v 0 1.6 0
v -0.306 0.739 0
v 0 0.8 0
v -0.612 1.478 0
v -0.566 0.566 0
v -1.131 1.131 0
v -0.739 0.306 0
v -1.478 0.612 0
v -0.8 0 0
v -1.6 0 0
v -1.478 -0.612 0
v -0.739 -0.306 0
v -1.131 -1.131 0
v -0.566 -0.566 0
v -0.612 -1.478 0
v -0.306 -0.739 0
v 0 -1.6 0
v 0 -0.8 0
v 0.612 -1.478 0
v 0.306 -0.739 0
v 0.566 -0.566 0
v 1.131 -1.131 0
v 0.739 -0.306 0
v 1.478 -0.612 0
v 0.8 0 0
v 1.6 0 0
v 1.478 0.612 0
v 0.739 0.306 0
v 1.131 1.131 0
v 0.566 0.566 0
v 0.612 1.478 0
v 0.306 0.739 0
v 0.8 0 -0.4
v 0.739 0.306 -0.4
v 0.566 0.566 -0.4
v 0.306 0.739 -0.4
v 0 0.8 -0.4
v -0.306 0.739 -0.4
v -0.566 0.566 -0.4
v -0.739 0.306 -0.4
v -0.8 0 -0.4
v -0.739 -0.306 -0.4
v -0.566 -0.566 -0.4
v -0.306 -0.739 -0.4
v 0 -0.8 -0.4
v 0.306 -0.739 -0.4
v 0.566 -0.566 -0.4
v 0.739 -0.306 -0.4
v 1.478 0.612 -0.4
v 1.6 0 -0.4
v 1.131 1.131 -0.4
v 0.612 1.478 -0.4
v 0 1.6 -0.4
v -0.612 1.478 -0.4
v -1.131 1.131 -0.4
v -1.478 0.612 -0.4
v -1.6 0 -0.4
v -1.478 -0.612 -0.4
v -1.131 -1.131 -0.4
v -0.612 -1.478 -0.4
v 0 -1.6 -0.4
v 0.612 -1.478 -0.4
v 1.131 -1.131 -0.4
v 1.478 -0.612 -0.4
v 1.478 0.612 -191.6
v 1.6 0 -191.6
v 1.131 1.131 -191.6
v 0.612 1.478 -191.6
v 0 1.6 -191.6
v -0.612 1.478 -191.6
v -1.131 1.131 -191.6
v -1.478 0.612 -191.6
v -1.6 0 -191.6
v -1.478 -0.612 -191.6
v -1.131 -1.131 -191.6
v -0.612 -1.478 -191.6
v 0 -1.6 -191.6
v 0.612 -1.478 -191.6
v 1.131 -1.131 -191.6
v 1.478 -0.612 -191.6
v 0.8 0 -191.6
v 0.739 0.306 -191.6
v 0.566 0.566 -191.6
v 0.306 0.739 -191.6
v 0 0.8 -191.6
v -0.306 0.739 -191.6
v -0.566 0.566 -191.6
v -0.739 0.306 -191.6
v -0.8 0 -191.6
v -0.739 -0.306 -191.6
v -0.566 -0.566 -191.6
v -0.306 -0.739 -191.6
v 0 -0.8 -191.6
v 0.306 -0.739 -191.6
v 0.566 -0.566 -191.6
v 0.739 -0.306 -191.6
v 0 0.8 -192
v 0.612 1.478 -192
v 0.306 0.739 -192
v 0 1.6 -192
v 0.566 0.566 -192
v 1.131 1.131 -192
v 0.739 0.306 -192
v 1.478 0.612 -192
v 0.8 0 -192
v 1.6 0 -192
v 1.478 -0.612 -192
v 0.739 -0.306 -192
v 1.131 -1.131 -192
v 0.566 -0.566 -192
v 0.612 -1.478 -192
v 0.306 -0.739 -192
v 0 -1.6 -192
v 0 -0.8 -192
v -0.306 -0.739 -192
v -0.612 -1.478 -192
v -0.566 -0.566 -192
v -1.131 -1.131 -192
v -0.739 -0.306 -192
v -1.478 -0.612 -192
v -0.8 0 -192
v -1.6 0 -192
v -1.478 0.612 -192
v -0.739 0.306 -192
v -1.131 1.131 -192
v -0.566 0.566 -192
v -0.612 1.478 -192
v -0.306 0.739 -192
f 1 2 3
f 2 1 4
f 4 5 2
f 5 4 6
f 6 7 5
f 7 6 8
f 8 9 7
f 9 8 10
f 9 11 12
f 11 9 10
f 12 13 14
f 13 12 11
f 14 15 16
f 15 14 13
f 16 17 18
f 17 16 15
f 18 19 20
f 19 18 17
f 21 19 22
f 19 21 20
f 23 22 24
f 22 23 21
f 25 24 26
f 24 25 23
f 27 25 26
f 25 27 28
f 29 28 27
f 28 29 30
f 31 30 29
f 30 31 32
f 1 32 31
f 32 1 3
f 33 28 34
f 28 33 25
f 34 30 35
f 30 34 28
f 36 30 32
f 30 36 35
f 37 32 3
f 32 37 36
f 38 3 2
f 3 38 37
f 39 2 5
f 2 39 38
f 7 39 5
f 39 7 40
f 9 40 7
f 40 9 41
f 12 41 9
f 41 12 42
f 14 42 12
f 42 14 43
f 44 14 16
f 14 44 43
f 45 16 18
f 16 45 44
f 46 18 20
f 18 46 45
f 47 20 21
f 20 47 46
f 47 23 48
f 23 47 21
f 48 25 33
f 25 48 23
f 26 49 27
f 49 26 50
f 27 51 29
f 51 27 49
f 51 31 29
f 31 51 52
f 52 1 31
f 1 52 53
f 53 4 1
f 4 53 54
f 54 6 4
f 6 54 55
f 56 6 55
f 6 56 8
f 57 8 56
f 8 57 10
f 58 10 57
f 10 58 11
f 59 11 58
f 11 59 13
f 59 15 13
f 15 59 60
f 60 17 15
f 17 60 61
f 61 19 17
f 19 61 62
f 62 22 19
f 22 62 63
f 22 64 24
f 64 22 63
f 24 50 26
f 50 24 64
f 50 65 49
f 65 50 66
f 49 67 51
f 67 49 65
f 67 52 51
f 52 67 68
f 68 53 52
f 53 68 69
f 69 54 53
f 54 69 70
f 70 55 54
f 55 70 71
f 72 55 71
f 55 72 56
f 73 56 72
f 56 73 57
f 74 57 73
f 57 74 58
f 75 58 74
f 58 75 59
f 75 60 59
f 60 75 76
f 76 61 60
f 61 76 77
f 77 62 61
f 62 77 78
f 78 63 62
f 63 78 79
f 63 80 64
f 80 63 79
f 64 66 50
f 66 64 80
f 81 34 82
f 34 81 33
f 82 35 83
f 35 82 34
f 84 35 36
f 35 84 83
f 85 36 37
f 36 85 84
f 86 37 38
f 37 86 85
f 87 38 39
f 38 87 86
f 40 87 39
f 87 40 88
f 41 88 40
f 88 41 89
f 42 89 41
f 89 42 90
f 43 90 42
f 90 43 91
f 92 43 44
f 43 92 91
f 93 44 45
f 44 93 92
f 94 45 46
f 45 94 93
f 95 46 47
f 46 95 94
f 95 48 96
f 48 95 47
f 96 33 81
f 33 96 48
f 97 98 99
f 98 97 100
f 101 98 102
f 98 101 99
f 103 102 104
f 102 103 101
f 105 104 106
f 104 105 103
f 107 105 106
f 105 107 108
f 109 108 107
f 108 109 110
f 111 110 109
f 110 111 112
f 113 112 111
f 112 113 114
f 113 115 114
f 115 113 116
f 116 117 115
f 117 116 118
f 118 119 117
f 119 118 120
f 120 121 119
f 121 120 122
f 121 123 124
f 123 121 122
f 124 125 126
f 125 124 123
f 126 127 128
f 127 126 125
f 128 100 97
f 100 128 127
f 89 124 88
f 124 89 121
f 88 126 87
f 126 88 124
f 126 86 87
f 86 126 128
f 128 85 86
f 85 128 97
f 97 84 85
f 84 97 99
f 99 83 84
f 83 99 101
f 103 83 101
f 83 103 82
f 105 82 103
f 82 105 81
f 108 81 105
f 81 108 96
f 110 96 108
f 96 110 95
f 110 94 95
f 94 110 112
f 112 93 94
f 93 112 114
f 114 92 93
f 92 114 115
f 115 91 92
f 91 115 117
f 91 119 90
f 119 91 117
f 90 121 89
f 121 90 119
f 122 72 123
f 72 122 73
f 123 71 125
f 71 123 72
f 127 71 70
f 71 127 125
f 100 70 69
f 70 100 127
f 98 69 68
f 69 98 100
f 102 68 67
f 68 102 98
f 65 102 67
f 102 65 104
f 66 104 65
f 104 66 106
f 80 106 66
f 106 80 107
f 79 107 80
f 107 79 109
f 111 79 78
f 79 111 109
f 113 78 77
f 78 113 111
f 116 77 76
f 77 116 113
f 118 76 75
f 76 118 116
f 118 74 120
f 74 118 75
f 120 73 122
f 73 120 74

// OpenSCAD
// file: ../p/4-4ring1.scad
use <../lib.scad>
function ldraw_lib__4_4ring1() = [
// 0 Ring  1 x 1.0
// 0 Name: 4-4ring1.dat
// 0 Author: James Jessiman
// 0 !LDRAW_ORG Primitive UPDATE 2009-01
// 0 !LICENSE Licensed under CC BY 2.0 and CC BY 4.0 : see CAreadme.txt
// 
// 0 BFC CERTIFY CCW
  [0,"BFC","CERTIFY"],
  [0,"BFC","CCW"],
// 
// 0 !HISTORY 1998-12-15 [PTadmin] Official Update 1998-10
// 0 !HISTORY 2002-04-08 [BrickCaster] Modified for BFC compliance
// 0 !HISTORY 2002-04-25 [PTadmin] Official Update 2002-02
// 0 !HISTORY 2007-06-24 [PTadmin] Header formatted for Contributor Agreement
// 0 !HISTORY 2008-07-01 [PTadmin] Official Update 2008-01
// 0 !HISTORY 2008-08-26 [cwdee] Switch polygon winding and rename
// 0 !HISTORY 2009-05-02 [PTadmin] Official Update 2009-01
// 
// 
// 4 16 -0.7654 0 1.8478 -0.3827 0 0.9239 0 0 1 0 0 2
  [4,16,-0.7654,0,1.8478,-0.3827,0,0.9239,0,0,1,0,0,2],
// 4 16 -1.4142 0 1.4142 -0.7071 0 0.7071 -0.3827 0 0.9239 -0.7654 0 1.8478
  [4,16,-1.4142,0,1.4142,-0.7071,0,0.7071,-0.3827,0,0.9239,-0.7654,0,1.8478],
// 4 16 -1.8478 0 0.7654 -0.9239 0 0.3827 -0.7071 0 0.7071 -1.4142 0 1.41420
  [4,16,-1.8478,0,0.7654,-0.9239,0,0.3827,-0.7071,0,0.7071,-1.4142,0,1.41420],
// 4 16 -2 0 0 -1 0 0 -0.9239 0 0.3827 -1.8478 0 0.7654
  [4,16,-2,0,0,-1,0,0,-0.9239,0,0.3827,-1.8478,0,0.7654],
// 4 16 -1.8478 0 -0.7654 -0.9239 0 -0.3827 -1 0 0 -2 0 0
  [4,16,-1.8478,0,-0.7654,-0.9239,0,-0.3827,-1,0,0,-2,0,0],
// 4 16 -1.4142 0 -1.4142 -0.7071 0 -0.7071 -0.9239 0 -0.3827 -1.8478 0 -0.7654
  [4,16,-1.4142,0,-1.4142,-0.7071,0,-0.7071,-0.9239,0,-0.3827,-1.8478,0,-0.7654],
// 4 16 -0.7654 0 -1.8478 -0.3827 0 -0.9239 -0.7071 0 -0.7071 -1.4142 0 -1.4142
  [4,16,-0.7654,0,-1.8478,-0.3827,0,-0.9239,-0.7071,0,-0.7071,-1.4142,0,-1.4142],
// 4 16 0 0 -2 0 0 -1 -0.3827 0 -0.9239 -0.7654 0 -1.8478
  [4,16,0,0,-2,0,0,-1,-0.3827,0,-0.9239,-0.7654,0,-1.8478],
// 4 16 0.7654 0 -1.8478 0.3827 0 -0.9239 0 0 -1 0 0 -2
  [4,16,0.7654,0,-1.8478,0.3827,0,-0.9239,0,0,-1,0,0,-2],
// 4 16 1.4142 0 -1.4142 0.7071 0 -0.7071 0.3827 0 -0.9239 0.7654 0 -1.8478
  [4,16,1.4142,0,-1.4142,0.7071,0,-0.7071,0.3827,0,-0.9239,0.7654,0,-1.8478],
// 4 16 1.8478 0 -0.7654 0.9239 0 -0.3827 0.7071 0 -0.7071 1.4142 0 -1.4142
  [4,16,1.8478,0,-0.7654,0.9239,0,-0.3827,0.7071,0,-0.7071,1.4142,0,-1.4142],
// 4 16 2 0 0 1 0 0 0.9239 0 -0.3827 1.8478 0 -0.7654
  [4,16,2,0,0,1,0,0,0.9239,0,-0.3827,1.8478,0,-0.7654],
// 4 16 1.8478 0 0.7654 0.9239 0 0.3827 1 0 0 2 0 0
  [4,16,1.8478,0,0.7654,0.9239,0,0.3827,1,0,0,2,0,0],
// 4 16 1.4142 0 1.4142 0.7071 0 0.7071 0.9239 0 0.3827 1.8478 0 0.7654
  [4,16,1.4142,0,1.4142,0.7071,0,0.7071,0.9239,0,0.3827,1.8478,0,0.7654],
// 4 16 0.7654 0 1.8478 0.3827 0 0.9239 0.7071 0 0.7071 1.4142 0 1.4142
  [4,16,0.7654,0,1.8478,0.3827,0,0.9239,0.7071,0,0.7071,1.4142,0,1.4142],
// 4 16 0 0 2 0 0 1 0.3827 0 0.9239 0.7654 0 1.8478
  [4,16,0,0,2,0,0,1,0.3827,0,0.9239,0.7654,0,1.8478],
// 0
];
makepoly(ldraw_lib__4_4ring1(), line=0.2);
// file: ../p/4-4edge.scad
use <../lib.scad>
function ldraw_lib__4_4edge() = [
// 0 Circle 1.0
// 0 Name: 4-4edge.dat
// 0 Author: James Jessiman
// 0 !LDRAW_ORG Primitive UPDATE 2017-01
// 0 !LICENSE Licensed under CC BY 2.0 and CC BY 4.0 : see CAreadme.txt
// 
// 0 BFC CERTIFY CCW
  [0,"BFC","CERTIFY"],
  [0,"BFC","CCW"],
// 
// 0 !HISTORY 1998-12-15 [PTadmin] Official Update 1998-10
// 0 !HISTORY 2005-12-28 [PTadmin] Official Update 2005-01
// 0 !HISTORY 2007-06-24 [PTadmin] Header formatted for Contributor Agreement
// 0 !HISTORY 2008-07-01 [PTadmin] Official Update 2008-01
// 0 !HISTORY 2017-01-15 [Steffen] BFCed
// 0 !HISTORY 2017-12-30 [PTadmin] Official Update 2017-01
// 
// 
// 2 24 1 0 0 0.9239 0 0.3827
  [2,24,1,0,0,0.9239,0,0.3827],
// 2 24 0.9239 0 0.3827 0.7071 0 0.7071
  [2,24,0.9239,0,0.3827,0.7071,0,0.7071],
// 2 24 0.7071 0 0.7071 0.3827 0 0.9239
  [2,24,0.7071,0,0.7071,0.3827,0,0.9239],
// 2 24 0.3827 0 0.9239 0 0 1
  [2,24,0.3827,0,0.9239,0,0,1],
// 2 24 0 0 1 -0.3827 0 0.9239
  [2,24,0,0,1,-0.3827,0,0.9239],
// 2 24 -0.3827 0 0.9239 -0.7071 0 0.7071
  [2,24,-0.3827,0,0.9239,-0.7071,0,0.7071],
// 2 24 -0.7071 0 0.7071 -0.9239 0 0.3827
  [2,24,-0.7071,0,0.7071,-0.9239,0,0.3827],
// 2 24 -0.9239 0 0.3827 -1 0 -0
  [2,24,-0.9239,0,0.3827,-1,0,-0],
// 2 24 -1 0 -0 -0.9239 0 -0.3827
  [2,24,-1,0,-0,-0.9239,0,-0.3827],
// 2 24 -0.9239 0 -0.3827 -0.7071 0 -0.7071
  [2,24,-0.9239,0,-0.3827,-0.7071,0,-0.7071],
// 2 24 -0.7071 0 -0.7071 -0.3827 0 -0.9239
  [2,24,-0.7071,0,-0.7071,-0.3827,0,-0.9239],
// 2 24 -0.3827 0 -0.9239 0 0 -1
  [2,24,-0.3827,0,-0.9239,0,0,-1],
// 2 24 0 0 -1 0.3827 0 -0.9239
  [2,24,0,0,-1,0.3827,0,-0.9239],
// 2 24 0.3827 0 -0.9239 0.7071 0 -0.7071
  [2,24,0.3827,0,-0.9239,0.7071,0,-0.7071],
// 2 24 0.7071 0 -0.7071 0.9239 0 -0.3827
  [2,24,0.7071,0,-0.7071,0.9239,0,-0.3827],
// 2 24 0.9239 0 -0.3827 1 0 0
  [2,24,0.9239,0,-0.3827,1,0,0],
];
makepoly(ldraw_lib__4_4edge(), line=0.2);
// file: ../p/4-4cyli.scad
use <../lib.scad>
function ldraw_lib__4_4cyli() = [
// 0 Cylinder 1.0
// 0 Name: 4-4cyli.dat
// 0 Author: James Jessiman
// 0 !LDRAW_ORG Primitive UPDATE 2005-01
// 0 !LICENSE Licensed under CC BY 2.0 and CC BY 4.0 : see CAreadme.txt
// 
// 0 BFC CERTIFY CCW
  [0,"BFC","CERTIFY"],
  [0,"BFC","CCW"],
// 
// 0 !HISTORY 1998-12-15 [PTadmin] Official Update 1998-10
// 0 !HISTORY 2002-03-23 [sbliss] Added BFC statement; merged headers from files in distributions LDraw 0.27 and Complete.
// 0 !HISTORY 2002-04-25 [PTadmin] Official Update 2002-02
// 0 !HISTORY 2004-12-14 [guyvivan] BFC CCW
// 0 !HISTORY 2005-12-28 [PTadmin] Official Update 2005-01
// 0 !HISTORY 2007-06-24 [PTadmin] Header formatted for Contributor Agreement
// 0 !HISTORY 2008-07-01 [PTadmin] Official Update 2008-01
// 
// 
// 4 16 1 1 0 0.9239 1 0.3827 0.9239 0 0.3827 1 0 0
  [4,16,1,1,0,0.9239,1,0.3827,0.9239,0,0.3827,1,0,0],
// 5 24 1 0 0 1 1 0 0.9239 0 0.3827 0.9239 0 -0.3827
  [5,24,1,0,0,1,1,0,0.9239,0,0.3827,0.9239,0,-0.3827],
// 4 16 0.9239 1 0.3827 0.7071 1 0.7071 0.7071 0 0.7071 0.9239 0 0.3827
  [4,16,0.9239,1,0.3827,0.7071,1,0.7071,0.7071,0,0.7071,0.9239,0,0.3827],
// 5 24 0.9239 0 0.3827 0.9239 1 0.3827 0.7071 0 0.7071 1 0 0
  [5,24,0.9239,0,0.3827,0.9239,1,0.3827,0.7071,0,0.7071,1,0,0],
// 4 16 0.7071 1 0.7071 0.3827 1 0.9239 0.3827 0 0.9239 0.7071 0 0.7071
  [4,16,0.7071,1,0.7071,0.3827,1,0.9239,0.3827,0,0.9239,0.7071,0,0.7071],
// 5 24 0.7071 0 0.7071 0.7071 1 0.7071 0.3827 0 0.9239 0.9239 0 0.3827
  [5,24,0.7071,0,0.7071,0.7071,1,0.7071,0.3827,0,0.9239,0.9239,0,0.3827],
// 4 16 0.3827 1 0.9239 0 1 1 0 0 1 0.3827 0 0.9239
  [4,16,0.3827,1,0.9239,0,1,1,0,0,1,0.3827,0,0.9239],
// 5 24 0.3827 0 0.9239 0.3827 1 0.9239 0 0 1 0.7071 0 0.7071
  [5,24,0.3827,0,0.9239,0.3827,1,0.9239,0,0,1,0.7071,0,0.7071],
// 4 16 0 1 1 -0.3827 1 0.9239 -0.3827 0 0.9239 0 0 1
  [4,16,0,1,1,-0.3827,1,0.9239,-0.3827,0,0.9239,0,0,1],
// 5 24 0 0 1 0 1 1 -0.3827 0 0.9239 0.3827 0 0.9239
  [5,24,0,0,1,0,1,1,-0.3827,0,0.9239,0.3827,0,0.9239],
// 4 16 -0.3827 1 0.9239 -0.7071 1 0.7071 -0.7071 0 0.7071 -0.3827 0 0.9239
  [4,16,-0.3827,1,0.9239,-0.7071,1,0.7071,-0.7071,0,0.7071,-0.3827,0,0.9239],
// 5 24 -0.3827 0 0.9239 -0.3827 1 0.9239 -0.7071 0 0.7071 0 0 1
  [5,24,-0.3827,0,0.9239,-0.3827,1,0.9239,-0.7071,0,0.7071,0,0,1],
// 4 16 -0.7071 1 0.7071 -0.9239 1 0.3827 -0.9239 0 0.3827 -0.7071 0 0.7071
  [4,16,-0.7071,1,0.7071,-0.9239,1,0.3827,-0.9239,0,0.3827,-0.7071,0,0.7071],
// 5 24 -0.7071 0 0.7071 -0.7071 1 0.7071 -0.9239 0 0.3827 -0.3827 0 0.9239
  [5,24,-0.7071,0,0.7071,-0.7071,1,0.7071,-0.9239,0,0.3827,-0.3827,0,0.9239],
// 4 16 -0.9239 1 0.3827 -1 1 0 -1 0 0 -0.9239 0 0.3827
  [4,16,-0.9239,1,0.3827,-1,1,0,-1,0,0,-0.9239,0,0.3827],
// 5 24 -0.9239 0 0.3827 -0.9239 1 0.3827 -1 0 0 -0.7071 0 0.7071
  [5,24,-0.9239,0,0.3827,-0.9239,1,0.3827,-1,0,0,-0.7071,0,0.7071],
// 4 16 -1 1 0 -0.9239 1 -0.3827 -0.9239 0 -0.3827 -1 0 0
  [4,16,-1,1,0,-0.9239,1,-0.3827,-0.9239,0,-0.3827,-1,0,0],
// 5 24 -1 0 0 -1 1 0 -0.9239 0 -0.3827 -0.9239 0 0.3827
  [5,24,-1,0,0,-1,1,0,-0.9239,0,-0.3827,-0.9239,0,0.3827],
// 4 16 -0.9239 1 -0.3827 -0.7071 1 -0.7071 -0.7071 0 -0.7071 -0.9239 0 -0.3827
  [4,16,-0.9239,1,-0.3827,-0.7071,1,-0.7071,-0.7071,0,-0.7071,-0.9239,0,-0.3827],
// 5 24 -0.9239 0 -0.3827 -0.9239 1 -0.3827 -0.7071 0 -0.7071 -1 0 0
  [5,24,-0.9239,0,-0.3827,-0.9239,1,-0.3827,-0.7071,0,-0.7071,-1,0,0],
// 4 16 -0.7071 1 -0.7071 -0.3827 1 -0.9239 -0.3827 0 -0.9239 -0.7071 0 -0.7071
  [4,16,-0.7071,1,-0.7071,-0.3827,1,-0.9239,-0.3827,0,-0.9239,-0.7071,0,-0.7071],
// 5 24 -0.7071 0 -0.7071 -0.7071 1 -0.7071 -0.3827 0 -0.9239 -0.9239 0 -0.3827
  [5,24,-0.7071,0,-0.7071,-0.7071,1,-0.7071,-0.3827,0,-0.9239,-0.9239,0,-0.3827],
// 4 16 -0.3827 1 -0.9239 0 1 -1 0 0 -1 -0.3827 0 -0.9239
  [4,16,-0.3827,1,-0.9239,0,1,-1,0,0,-1,-0.3827,0,-0.9239],
// 5 24 -0.3827 0 -0.9239 -0.3827 1 -0.9239 0 0 -1 -0.7071 0 -0.7071
  [5,24,-0.3827,0,-0.9239,-0.3827,1,-0.9239,0,0,-1,-0.7071,0,-0.7071],
// 4 16 0 1 -1 0.3827 1 -0.9239 0.3827 0 -0.9239 0 0 -1
  [4,16,0,1,-1,0.3827,1,-0.9239,0.3827,0,-0.9239,0,0,-1],
// 5 24 0 0 -1 0 1 -1 0.3827 0 -0.9239 -0.3827 0 -0.9239
  [5,24,0,0,-1,0,1,-1,0.3827,0,-0.9239,-0.3827,0,-0.9239],
// 4 16 0.3827 1 -0.9239 0.7071 1 -0.7071 0.7071 0 -0.7071 0.3827 0 -0.9239
  [4,16,0.3827,1,-0.9239,0.7071,1,-0.7071,0.7071,0,-0.7071,0.3827,0,-0.9239],
// 5 24 0.3827 0 -0.9239 0.3827 1 -0.9239 0.7071 0 -0.7071 0 0 -1
  [5,24,0.3827,0,-0.9239,0.3827,1,-0.9239,0.7071,0,-0.7071,0,0,-1],
// 4 16 0.7071 1 -0.7071 0.9239 1 -0.3827 0.9239 0 -0.3827 0.7071 0 -0.7071
  [4,16,0.7071,1,-0.7071,0.9239,1,-0.3827,0.9239,0,-0.3827,0.7071,0,-0.7071],
// 5 24 0.7071 0 -0.7071 0.7071 1 -0.7071 0.9239 0 -0.3827 0.3827 0 -0.9239
  [5,24,0.7071,0,-0.7071,0.7071,1,-0.7071,0.9239,0,-0.3827,0.3827,0,-0.9239],
// 4 16 0.9239 1 -0.3827 1 1 0 1 0 0 0.9239 0 -0.3827
  [4,16,0.9239,1,-0.3827,1,1,0,1,0,0,0.9239,0,-0.3827],
// 5 24 0.9239 0 -0.3827 0.9239 1 -0.3827 1 0 0 0.7071 0 -0.7071
  [5,24,0.9239,0,-0.3827,0.9239,1,-0.3827,1,0,0,0.7071,0,-0.7071],
// 0
];
makepoly(ldraw_lib__4_4cyli(), line=0.2);
// file: u9053.scad
use <../lib.scad>
use <../p/4-4cyli.scad>
use <../p/4-4edge.scad>
use <../p/4-4ring1.scad>
function ldraw_lib__u9053() = [
// 0 ~Technic Flex-System Hose End
// 0 Name: u9053.dat
// 0 Author: William Howard [WilliamH]
// 0 !LDRAW_ORG Part UPDATE 2011-02
// 0 !LICENSE Licensed under CC BY 2.0 and CC BY 4.0 : see CAreadme.txt
// 
// 0 BFC CERTIFY CCW
  [0,"BFC","CERTIFY"],
  [0,"BFC","CCW"],
// 
// 0 !HISTORY 2011-12-21 [cwdee] Reworked subparting technique
// 0 !HISTORY 2011-12-23 [PTadmin] Renamed from 76
// 0 !HISTORY 2011-12-29 [PTadmin] Official Update 2011-02
// 
// 
// 1 16 0 0 0 2 0 0 0 1 0 0 0 2 4-4ring1.dat
  [1,16,0,0,0,2,0,0,0,1,0,0,0,2, ldraw_lib__4_4ring1()],
// 1 16 0 0 0 2 0 0 0 1 0 0 0 2 4-4edge.dat
  [1,16,0,0,0,2,0,0,0,1,0,0,0,2, ldraw_lib__4_4edge()],
// 0 BFC INVERTNEXT
  [0,"BFC","INVERTNEXT"],
// 1 16 0 0 0 2 0 0 0 1 0 0 0 2 4-4cyli.dat
  [1,16,0,0,0,2,0,0,0,1,0,0,0,2, ldraw_lib__4_4cyli()],
// 1 16 0 0 0 4 0 0 0 1 0 0 0 4 4-4edge.dat
  [1,16,0,0,0,4,0,0,0,1,0,0,0,4, ldraw_lib__4_4edge()],
// 1 16 0 0 0 4 0 0 0 1 0 0 0 4 4-4cyli.dat
  [1,16,0,0,0,4,0,0,0,1,0,0,0,4, ldraw_lib__4_4cyli()],
// 0
];
makepoly(ldraw_lib__u9053(), line=0.2);
// file: 77.scad
use <../lib.scad>
use <../p/4-4cyli.scad>
function ldraw_lib__77() = [
// 0 ~Technic Flex-System Hose Segment
// 0 Name: 77.dat
// 0 Author: William Howard [WilliamH]
// 0 !LDRAW_ORG Part UPDATE 2011-02
// 0 !LICENSE Licensed under CC BY 2.0 and CC BY 4.0 : see CAreadme.txt
// 
// 0 BFC CERTIFY CCW
  [0,"BFC","CERTIFY"],
  [0,"BFC","CCW"],
// 
// 0 !HISTORY 2011-12-21 [cwdee] Reworked subparting technique
// 0 !HISTORY 2011-12-29 [PTadmin] Official Update 2011-02
// 
// 
// 1 16 0 0 0 4 0 0 0 1 0 0 0 4 4-4cyli.dat
  [1,16,0,0,0,4,0,0,0,1,0,0,0,4, ldraw_lib__4_4cyli()],
// 0 BFC INVERTNEXT
  [0,"BFC","INVERTNEXT"],
// 1 16 0 0 0 2 0 0 0 1 0 0 0 2 4-4cyli.dat
  [1,16,0,0,0,2,0,0,0,1,0,0,0,2, ldraw_lib__4_4cyli()],
// 0
];
makepoly(ldraw_lib__77(), line=0.2);
// main file
use <../lib.scad>
use <77.scad>
use <u9053.scad>
function ldraw_lib__76277() = [
// 0 Technic Flex-System Hose 24L (480LDU)
// 0 Name: 76277.dat
// 0 Author: Tim Gould [timgould]
// 0 !LDRAW_ORG Part UPDATE 2011-02
// 0 !LICENSE Licensed under CC BY 2.0 and CC BY 4.0 : see CAreadme.txt
// 
// 0 BFC CERTIFY CCW
  [0,"BFC","CERTIFY"],
  [0,"BFC","CCW"],
// 
// 0 !KEYWORDS bar, tube
// 
// 0 !HISTORY 2011-12-29 [PTadmin] Official Update 2011-02
// 
// 
// 1 16 0 0 0 1 0 0 0 1 0 0 0 1 u9053.dat
  [1,16,0,0,0,1,0,0,0,1,0,0,0,1, ldraw_lib__u9053()],
// 1 16 0 1 0 1 0 0 0 478 0 0 0 1 77.dat
  [1,16,0,1,0,1,0,0,0,478,0,0,0,1, ldraw_lib__77()],
// 1 16 0 480 0 -1 0 0 0 -1 0 0 0 1 u9053.dat
  [1,16,0,480,0,-1,0,0,0,-1,0,0,0,1, ldraw_lib__u9053()],
];
makepoly(ldraw_lib__76277(), line=0.2);
